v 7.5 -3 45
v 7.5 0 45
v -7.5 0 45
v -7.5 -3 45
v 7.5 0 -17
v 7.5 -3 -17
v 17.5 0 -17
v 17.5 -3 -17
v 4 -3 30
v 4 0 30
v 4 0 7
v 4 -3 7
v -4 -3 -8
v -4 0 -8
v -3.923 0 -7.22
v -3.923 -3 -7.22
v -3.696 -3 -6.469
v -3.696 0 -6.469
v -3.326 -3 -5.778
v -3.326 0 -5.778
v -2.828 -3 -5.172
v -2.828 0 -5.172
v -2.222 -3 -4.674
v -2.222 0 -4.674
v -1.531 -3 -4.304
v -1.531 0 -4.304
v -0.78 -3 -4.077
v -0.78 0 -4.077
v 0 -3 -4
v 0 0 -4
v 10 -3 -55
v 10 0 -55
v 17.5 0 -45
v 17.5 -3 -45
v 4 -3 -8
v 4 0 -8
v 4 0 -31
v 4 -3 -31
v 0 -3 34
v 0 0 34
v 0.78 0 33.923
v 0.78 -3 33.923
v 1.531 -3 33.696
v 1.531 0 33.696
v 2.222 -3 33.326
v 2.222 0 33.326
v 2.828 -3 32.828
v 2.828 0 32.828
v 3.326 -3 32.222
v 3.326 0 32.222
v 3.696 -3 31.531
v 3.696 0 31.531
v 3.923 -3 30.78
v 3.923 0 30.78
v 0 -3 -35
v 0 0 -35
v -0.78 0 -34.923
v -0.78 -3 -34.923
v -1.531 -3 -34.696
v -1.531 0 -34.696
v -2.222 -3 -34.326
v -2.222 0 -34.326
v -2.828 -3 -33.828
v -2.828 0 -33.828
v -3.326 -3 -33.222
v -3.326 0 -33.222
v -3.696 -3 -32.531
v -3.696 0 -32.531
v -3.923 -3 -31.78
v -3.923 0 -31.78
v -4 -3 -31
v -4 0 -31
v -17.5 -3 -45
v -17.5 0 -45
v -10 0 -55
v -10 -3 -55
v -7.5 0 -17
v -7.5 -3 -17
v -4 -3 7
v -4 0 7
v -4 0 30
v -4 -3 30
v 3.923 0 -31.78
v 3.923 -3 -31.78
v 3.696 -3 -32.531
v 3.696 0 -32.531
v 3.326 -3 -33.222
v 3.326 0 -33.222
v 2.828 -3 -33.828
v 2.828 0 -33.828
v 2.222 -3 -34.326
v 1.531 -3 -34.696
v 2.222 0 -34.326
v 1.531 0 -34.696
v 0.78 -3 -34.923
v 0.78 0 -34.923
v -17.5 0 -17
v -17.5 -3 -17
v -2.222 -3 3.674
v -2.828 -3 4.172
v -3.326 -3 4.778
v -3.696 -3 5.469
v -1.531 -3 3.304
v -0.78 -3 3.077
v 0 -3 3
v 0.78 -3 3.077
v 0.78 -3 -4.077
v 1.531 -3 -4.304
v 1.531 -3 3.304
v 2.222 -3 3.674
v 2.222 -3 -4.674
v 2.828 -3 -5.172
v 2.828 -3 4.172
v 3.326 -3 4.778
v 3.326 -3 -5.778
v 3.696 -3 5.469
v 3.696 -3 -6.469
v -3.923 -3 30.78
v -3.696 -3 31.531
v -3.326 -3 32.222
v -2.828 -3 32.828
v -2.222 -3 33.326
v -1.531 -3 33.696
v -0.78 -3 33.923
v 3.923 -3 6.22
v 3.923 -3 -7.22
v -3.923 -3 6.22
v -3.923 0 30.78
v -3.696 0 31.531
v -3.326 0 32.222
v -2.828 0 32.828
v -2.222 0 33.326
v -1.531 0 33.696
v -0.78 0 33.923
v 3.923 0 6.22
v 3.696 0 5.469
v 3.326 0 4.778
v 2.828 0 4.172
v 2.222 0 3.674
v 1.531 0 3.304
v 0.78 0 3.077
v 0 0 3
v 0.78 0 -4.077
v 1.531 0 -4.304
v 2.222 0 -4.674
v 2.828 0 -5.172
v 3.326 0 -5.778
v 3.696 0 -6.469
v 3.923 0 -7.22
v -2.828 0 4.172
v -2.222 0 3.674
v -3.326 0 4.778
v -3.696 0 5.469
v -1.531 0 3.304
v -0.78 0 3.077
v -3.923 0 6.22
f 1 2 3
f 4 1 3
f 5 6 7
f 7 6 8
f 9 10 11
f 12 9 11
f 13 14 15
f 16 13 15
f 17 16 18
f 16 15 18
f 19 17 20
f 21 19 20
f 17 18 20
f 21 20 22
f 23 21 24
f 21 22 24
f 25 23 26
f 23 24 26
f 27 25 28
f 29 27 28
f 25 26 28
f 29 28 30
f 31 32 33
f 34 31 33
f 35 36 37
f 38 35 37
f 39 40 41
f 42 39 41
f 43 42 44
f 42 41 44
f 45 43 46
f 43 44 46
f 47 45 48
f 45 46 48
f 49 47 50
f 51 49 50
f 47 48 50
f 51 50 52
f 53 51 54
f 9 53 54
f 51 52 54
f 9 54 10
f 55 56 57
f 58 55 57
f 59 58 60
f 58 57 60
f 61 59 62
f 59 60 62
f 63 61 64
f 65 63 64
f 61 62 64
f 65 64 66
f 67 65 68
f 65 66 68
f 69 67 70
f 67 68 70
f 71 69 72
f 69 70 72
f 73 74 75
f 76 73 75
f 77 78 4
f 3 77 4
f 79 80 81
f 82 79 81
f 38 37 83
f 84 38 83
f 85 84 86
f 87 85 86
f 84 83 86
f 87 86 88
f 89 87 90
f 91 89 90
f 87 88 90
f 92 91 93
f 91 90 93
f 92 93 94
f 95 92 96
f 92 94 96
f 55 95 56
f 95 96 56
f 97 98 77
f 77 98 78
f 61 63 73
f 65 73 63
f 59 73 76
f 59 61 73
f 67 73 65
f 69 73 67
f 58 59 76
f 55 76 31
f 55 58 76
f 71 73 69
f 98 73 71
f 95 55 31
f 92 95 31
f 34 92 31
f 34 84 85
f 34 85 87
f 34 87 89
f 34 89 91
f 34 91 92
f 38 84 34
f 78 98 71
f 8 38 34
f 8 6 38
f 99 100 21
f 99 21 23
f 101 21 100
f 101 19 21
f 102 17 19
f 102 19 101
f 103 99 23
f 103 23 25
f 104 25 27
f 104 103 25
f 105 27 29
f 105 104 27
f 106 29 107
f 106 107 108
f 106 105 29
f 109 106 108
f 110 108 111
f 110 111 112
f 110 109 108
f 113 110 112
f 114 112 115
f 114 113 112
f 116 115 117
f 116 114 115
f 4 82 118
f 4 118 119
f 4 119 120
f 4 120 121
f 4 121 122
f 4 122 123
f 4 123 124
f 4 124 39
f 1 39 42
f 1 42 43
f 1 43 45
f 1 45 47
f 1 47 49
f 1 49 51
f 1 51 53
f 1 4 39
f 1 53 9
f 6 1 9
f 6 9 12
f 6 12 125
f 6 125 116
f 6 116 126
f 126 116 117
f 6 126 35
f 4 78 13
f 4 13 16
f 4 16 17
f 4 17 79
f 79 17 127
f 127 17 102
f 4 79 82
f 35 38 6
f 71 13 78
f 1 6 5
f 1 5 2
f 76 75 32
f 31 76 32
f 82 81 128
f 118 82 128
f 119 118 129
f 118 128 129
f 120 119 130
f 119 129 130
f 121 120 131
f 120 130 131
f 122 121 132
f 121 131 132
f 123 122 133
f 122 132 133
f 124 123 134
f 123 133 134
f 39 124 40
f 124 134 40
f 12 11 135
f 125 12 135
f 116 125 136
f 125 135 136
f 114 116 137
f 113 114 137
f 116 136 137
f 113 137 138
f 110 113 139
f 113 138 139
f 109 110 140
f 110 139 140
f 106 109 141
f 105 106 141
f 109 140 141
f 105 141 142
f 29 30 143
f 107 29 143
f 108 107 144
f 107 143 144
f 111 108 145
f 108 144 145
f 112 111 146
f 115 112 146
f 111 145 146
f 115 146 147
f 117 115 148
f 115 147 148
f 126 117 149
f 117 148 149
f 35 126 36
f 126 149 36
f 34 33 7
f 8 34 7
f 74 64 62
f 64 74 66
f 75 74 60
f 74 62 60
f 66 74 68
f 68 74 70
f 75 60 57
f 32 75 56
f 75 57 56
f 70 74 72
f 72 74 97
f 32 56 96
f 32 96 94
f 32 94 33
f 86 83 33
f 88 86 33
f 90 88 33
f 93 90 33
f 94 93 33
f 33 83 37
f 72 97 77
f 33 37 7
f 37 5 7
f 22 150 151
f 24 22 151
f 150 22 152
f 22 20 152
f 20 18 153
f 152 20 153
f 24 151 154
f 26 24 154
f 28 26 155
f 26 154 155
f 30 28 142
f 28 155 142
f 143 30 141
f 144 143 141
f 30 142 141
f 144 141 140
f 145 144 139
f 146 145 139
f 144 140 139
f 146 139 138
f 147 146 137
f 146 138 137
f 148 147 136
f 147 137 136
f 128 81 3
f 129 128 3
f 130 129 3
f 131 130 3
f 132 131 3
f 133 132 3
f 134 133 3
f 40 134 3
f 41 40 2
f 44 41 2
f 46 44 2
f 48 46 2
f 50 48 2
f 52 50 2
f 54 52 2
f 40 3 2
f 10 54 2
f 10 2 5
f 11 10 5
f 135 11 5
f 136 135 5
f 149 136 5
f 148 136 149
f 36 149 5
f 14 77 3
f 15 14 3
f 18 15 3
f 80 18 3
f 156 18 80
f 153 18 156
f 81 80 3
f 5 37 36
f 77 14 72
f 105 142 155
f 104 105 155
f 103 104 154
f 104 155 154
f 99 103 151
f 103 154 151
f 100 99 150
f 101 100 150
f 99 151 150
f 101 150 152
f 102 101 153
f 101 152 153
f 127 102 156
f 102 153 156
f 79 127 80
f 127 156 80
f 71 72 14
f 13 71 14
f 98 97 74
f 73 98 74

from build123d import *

# Parameters (mm, degrees)
F1_DEPTH = 3
F2_W     = 10
F2_H     = 62
F3_DEPTH = 25


with BuildPart() as f1:
    # F0 (on Front) → F1 (new body)
    with BuildSketch(Plane.XZ):
        Polygon((17.5, -45), (17.5, 45), (-17.5, 45), (-17.5, -45), (-10, -55), (10, -55), align=None)
        with BuildLine():
            Line((4, -8), (4, -31))
            ThreePointArc((4, -31), (2.828427, -33.828427), (0, -35))
            ThreePointArc((0, -35), (-2.828427, -33.828427), (-4, -31))
            Line((-4, -31), (-4, -8))
            ThreePointArc((-4, -8), (-2.828427, -5.171573), (0, -4))
            ThreePointArc((0, -4), (2.828427, -5.171573), (4, -8))
        make_face(mode=Mode.SUBTRACT)
        with BuildLine():
            Line((4, 30), (4, 7))
            ThreePointArc((4, 7), (2.828427, 4.171573), (0, 3))
            ThreePointArc((0, 3), (-2.828427, 4.171573), (-4, 7))
            Line((-4, 7), (-4, 30))
            ThreePointArc((-4, 30), (-2.828427, 32.828427), (0, 34))
            ThreePointArc((0, 34), (2.828427, 32.828427), (4, 30))
        make_face(mode=Mode.SUBTRACT)
    extrude(amount=F1_DEPTH)

    # F2 (on face) → F3 (cut)
    with BuildSketch(Plane.XZ.offset(3)):
        with Locations((-12.5, 14)):
            Rectangle(F2_W, F2_H)
        with Locations((12.5, 14)):
            Rectangle(F2_W, F2_H)
    extrude(amount=-F3_DEPTH, mode=Mode.SUBTRACT)


solid = f1.part
